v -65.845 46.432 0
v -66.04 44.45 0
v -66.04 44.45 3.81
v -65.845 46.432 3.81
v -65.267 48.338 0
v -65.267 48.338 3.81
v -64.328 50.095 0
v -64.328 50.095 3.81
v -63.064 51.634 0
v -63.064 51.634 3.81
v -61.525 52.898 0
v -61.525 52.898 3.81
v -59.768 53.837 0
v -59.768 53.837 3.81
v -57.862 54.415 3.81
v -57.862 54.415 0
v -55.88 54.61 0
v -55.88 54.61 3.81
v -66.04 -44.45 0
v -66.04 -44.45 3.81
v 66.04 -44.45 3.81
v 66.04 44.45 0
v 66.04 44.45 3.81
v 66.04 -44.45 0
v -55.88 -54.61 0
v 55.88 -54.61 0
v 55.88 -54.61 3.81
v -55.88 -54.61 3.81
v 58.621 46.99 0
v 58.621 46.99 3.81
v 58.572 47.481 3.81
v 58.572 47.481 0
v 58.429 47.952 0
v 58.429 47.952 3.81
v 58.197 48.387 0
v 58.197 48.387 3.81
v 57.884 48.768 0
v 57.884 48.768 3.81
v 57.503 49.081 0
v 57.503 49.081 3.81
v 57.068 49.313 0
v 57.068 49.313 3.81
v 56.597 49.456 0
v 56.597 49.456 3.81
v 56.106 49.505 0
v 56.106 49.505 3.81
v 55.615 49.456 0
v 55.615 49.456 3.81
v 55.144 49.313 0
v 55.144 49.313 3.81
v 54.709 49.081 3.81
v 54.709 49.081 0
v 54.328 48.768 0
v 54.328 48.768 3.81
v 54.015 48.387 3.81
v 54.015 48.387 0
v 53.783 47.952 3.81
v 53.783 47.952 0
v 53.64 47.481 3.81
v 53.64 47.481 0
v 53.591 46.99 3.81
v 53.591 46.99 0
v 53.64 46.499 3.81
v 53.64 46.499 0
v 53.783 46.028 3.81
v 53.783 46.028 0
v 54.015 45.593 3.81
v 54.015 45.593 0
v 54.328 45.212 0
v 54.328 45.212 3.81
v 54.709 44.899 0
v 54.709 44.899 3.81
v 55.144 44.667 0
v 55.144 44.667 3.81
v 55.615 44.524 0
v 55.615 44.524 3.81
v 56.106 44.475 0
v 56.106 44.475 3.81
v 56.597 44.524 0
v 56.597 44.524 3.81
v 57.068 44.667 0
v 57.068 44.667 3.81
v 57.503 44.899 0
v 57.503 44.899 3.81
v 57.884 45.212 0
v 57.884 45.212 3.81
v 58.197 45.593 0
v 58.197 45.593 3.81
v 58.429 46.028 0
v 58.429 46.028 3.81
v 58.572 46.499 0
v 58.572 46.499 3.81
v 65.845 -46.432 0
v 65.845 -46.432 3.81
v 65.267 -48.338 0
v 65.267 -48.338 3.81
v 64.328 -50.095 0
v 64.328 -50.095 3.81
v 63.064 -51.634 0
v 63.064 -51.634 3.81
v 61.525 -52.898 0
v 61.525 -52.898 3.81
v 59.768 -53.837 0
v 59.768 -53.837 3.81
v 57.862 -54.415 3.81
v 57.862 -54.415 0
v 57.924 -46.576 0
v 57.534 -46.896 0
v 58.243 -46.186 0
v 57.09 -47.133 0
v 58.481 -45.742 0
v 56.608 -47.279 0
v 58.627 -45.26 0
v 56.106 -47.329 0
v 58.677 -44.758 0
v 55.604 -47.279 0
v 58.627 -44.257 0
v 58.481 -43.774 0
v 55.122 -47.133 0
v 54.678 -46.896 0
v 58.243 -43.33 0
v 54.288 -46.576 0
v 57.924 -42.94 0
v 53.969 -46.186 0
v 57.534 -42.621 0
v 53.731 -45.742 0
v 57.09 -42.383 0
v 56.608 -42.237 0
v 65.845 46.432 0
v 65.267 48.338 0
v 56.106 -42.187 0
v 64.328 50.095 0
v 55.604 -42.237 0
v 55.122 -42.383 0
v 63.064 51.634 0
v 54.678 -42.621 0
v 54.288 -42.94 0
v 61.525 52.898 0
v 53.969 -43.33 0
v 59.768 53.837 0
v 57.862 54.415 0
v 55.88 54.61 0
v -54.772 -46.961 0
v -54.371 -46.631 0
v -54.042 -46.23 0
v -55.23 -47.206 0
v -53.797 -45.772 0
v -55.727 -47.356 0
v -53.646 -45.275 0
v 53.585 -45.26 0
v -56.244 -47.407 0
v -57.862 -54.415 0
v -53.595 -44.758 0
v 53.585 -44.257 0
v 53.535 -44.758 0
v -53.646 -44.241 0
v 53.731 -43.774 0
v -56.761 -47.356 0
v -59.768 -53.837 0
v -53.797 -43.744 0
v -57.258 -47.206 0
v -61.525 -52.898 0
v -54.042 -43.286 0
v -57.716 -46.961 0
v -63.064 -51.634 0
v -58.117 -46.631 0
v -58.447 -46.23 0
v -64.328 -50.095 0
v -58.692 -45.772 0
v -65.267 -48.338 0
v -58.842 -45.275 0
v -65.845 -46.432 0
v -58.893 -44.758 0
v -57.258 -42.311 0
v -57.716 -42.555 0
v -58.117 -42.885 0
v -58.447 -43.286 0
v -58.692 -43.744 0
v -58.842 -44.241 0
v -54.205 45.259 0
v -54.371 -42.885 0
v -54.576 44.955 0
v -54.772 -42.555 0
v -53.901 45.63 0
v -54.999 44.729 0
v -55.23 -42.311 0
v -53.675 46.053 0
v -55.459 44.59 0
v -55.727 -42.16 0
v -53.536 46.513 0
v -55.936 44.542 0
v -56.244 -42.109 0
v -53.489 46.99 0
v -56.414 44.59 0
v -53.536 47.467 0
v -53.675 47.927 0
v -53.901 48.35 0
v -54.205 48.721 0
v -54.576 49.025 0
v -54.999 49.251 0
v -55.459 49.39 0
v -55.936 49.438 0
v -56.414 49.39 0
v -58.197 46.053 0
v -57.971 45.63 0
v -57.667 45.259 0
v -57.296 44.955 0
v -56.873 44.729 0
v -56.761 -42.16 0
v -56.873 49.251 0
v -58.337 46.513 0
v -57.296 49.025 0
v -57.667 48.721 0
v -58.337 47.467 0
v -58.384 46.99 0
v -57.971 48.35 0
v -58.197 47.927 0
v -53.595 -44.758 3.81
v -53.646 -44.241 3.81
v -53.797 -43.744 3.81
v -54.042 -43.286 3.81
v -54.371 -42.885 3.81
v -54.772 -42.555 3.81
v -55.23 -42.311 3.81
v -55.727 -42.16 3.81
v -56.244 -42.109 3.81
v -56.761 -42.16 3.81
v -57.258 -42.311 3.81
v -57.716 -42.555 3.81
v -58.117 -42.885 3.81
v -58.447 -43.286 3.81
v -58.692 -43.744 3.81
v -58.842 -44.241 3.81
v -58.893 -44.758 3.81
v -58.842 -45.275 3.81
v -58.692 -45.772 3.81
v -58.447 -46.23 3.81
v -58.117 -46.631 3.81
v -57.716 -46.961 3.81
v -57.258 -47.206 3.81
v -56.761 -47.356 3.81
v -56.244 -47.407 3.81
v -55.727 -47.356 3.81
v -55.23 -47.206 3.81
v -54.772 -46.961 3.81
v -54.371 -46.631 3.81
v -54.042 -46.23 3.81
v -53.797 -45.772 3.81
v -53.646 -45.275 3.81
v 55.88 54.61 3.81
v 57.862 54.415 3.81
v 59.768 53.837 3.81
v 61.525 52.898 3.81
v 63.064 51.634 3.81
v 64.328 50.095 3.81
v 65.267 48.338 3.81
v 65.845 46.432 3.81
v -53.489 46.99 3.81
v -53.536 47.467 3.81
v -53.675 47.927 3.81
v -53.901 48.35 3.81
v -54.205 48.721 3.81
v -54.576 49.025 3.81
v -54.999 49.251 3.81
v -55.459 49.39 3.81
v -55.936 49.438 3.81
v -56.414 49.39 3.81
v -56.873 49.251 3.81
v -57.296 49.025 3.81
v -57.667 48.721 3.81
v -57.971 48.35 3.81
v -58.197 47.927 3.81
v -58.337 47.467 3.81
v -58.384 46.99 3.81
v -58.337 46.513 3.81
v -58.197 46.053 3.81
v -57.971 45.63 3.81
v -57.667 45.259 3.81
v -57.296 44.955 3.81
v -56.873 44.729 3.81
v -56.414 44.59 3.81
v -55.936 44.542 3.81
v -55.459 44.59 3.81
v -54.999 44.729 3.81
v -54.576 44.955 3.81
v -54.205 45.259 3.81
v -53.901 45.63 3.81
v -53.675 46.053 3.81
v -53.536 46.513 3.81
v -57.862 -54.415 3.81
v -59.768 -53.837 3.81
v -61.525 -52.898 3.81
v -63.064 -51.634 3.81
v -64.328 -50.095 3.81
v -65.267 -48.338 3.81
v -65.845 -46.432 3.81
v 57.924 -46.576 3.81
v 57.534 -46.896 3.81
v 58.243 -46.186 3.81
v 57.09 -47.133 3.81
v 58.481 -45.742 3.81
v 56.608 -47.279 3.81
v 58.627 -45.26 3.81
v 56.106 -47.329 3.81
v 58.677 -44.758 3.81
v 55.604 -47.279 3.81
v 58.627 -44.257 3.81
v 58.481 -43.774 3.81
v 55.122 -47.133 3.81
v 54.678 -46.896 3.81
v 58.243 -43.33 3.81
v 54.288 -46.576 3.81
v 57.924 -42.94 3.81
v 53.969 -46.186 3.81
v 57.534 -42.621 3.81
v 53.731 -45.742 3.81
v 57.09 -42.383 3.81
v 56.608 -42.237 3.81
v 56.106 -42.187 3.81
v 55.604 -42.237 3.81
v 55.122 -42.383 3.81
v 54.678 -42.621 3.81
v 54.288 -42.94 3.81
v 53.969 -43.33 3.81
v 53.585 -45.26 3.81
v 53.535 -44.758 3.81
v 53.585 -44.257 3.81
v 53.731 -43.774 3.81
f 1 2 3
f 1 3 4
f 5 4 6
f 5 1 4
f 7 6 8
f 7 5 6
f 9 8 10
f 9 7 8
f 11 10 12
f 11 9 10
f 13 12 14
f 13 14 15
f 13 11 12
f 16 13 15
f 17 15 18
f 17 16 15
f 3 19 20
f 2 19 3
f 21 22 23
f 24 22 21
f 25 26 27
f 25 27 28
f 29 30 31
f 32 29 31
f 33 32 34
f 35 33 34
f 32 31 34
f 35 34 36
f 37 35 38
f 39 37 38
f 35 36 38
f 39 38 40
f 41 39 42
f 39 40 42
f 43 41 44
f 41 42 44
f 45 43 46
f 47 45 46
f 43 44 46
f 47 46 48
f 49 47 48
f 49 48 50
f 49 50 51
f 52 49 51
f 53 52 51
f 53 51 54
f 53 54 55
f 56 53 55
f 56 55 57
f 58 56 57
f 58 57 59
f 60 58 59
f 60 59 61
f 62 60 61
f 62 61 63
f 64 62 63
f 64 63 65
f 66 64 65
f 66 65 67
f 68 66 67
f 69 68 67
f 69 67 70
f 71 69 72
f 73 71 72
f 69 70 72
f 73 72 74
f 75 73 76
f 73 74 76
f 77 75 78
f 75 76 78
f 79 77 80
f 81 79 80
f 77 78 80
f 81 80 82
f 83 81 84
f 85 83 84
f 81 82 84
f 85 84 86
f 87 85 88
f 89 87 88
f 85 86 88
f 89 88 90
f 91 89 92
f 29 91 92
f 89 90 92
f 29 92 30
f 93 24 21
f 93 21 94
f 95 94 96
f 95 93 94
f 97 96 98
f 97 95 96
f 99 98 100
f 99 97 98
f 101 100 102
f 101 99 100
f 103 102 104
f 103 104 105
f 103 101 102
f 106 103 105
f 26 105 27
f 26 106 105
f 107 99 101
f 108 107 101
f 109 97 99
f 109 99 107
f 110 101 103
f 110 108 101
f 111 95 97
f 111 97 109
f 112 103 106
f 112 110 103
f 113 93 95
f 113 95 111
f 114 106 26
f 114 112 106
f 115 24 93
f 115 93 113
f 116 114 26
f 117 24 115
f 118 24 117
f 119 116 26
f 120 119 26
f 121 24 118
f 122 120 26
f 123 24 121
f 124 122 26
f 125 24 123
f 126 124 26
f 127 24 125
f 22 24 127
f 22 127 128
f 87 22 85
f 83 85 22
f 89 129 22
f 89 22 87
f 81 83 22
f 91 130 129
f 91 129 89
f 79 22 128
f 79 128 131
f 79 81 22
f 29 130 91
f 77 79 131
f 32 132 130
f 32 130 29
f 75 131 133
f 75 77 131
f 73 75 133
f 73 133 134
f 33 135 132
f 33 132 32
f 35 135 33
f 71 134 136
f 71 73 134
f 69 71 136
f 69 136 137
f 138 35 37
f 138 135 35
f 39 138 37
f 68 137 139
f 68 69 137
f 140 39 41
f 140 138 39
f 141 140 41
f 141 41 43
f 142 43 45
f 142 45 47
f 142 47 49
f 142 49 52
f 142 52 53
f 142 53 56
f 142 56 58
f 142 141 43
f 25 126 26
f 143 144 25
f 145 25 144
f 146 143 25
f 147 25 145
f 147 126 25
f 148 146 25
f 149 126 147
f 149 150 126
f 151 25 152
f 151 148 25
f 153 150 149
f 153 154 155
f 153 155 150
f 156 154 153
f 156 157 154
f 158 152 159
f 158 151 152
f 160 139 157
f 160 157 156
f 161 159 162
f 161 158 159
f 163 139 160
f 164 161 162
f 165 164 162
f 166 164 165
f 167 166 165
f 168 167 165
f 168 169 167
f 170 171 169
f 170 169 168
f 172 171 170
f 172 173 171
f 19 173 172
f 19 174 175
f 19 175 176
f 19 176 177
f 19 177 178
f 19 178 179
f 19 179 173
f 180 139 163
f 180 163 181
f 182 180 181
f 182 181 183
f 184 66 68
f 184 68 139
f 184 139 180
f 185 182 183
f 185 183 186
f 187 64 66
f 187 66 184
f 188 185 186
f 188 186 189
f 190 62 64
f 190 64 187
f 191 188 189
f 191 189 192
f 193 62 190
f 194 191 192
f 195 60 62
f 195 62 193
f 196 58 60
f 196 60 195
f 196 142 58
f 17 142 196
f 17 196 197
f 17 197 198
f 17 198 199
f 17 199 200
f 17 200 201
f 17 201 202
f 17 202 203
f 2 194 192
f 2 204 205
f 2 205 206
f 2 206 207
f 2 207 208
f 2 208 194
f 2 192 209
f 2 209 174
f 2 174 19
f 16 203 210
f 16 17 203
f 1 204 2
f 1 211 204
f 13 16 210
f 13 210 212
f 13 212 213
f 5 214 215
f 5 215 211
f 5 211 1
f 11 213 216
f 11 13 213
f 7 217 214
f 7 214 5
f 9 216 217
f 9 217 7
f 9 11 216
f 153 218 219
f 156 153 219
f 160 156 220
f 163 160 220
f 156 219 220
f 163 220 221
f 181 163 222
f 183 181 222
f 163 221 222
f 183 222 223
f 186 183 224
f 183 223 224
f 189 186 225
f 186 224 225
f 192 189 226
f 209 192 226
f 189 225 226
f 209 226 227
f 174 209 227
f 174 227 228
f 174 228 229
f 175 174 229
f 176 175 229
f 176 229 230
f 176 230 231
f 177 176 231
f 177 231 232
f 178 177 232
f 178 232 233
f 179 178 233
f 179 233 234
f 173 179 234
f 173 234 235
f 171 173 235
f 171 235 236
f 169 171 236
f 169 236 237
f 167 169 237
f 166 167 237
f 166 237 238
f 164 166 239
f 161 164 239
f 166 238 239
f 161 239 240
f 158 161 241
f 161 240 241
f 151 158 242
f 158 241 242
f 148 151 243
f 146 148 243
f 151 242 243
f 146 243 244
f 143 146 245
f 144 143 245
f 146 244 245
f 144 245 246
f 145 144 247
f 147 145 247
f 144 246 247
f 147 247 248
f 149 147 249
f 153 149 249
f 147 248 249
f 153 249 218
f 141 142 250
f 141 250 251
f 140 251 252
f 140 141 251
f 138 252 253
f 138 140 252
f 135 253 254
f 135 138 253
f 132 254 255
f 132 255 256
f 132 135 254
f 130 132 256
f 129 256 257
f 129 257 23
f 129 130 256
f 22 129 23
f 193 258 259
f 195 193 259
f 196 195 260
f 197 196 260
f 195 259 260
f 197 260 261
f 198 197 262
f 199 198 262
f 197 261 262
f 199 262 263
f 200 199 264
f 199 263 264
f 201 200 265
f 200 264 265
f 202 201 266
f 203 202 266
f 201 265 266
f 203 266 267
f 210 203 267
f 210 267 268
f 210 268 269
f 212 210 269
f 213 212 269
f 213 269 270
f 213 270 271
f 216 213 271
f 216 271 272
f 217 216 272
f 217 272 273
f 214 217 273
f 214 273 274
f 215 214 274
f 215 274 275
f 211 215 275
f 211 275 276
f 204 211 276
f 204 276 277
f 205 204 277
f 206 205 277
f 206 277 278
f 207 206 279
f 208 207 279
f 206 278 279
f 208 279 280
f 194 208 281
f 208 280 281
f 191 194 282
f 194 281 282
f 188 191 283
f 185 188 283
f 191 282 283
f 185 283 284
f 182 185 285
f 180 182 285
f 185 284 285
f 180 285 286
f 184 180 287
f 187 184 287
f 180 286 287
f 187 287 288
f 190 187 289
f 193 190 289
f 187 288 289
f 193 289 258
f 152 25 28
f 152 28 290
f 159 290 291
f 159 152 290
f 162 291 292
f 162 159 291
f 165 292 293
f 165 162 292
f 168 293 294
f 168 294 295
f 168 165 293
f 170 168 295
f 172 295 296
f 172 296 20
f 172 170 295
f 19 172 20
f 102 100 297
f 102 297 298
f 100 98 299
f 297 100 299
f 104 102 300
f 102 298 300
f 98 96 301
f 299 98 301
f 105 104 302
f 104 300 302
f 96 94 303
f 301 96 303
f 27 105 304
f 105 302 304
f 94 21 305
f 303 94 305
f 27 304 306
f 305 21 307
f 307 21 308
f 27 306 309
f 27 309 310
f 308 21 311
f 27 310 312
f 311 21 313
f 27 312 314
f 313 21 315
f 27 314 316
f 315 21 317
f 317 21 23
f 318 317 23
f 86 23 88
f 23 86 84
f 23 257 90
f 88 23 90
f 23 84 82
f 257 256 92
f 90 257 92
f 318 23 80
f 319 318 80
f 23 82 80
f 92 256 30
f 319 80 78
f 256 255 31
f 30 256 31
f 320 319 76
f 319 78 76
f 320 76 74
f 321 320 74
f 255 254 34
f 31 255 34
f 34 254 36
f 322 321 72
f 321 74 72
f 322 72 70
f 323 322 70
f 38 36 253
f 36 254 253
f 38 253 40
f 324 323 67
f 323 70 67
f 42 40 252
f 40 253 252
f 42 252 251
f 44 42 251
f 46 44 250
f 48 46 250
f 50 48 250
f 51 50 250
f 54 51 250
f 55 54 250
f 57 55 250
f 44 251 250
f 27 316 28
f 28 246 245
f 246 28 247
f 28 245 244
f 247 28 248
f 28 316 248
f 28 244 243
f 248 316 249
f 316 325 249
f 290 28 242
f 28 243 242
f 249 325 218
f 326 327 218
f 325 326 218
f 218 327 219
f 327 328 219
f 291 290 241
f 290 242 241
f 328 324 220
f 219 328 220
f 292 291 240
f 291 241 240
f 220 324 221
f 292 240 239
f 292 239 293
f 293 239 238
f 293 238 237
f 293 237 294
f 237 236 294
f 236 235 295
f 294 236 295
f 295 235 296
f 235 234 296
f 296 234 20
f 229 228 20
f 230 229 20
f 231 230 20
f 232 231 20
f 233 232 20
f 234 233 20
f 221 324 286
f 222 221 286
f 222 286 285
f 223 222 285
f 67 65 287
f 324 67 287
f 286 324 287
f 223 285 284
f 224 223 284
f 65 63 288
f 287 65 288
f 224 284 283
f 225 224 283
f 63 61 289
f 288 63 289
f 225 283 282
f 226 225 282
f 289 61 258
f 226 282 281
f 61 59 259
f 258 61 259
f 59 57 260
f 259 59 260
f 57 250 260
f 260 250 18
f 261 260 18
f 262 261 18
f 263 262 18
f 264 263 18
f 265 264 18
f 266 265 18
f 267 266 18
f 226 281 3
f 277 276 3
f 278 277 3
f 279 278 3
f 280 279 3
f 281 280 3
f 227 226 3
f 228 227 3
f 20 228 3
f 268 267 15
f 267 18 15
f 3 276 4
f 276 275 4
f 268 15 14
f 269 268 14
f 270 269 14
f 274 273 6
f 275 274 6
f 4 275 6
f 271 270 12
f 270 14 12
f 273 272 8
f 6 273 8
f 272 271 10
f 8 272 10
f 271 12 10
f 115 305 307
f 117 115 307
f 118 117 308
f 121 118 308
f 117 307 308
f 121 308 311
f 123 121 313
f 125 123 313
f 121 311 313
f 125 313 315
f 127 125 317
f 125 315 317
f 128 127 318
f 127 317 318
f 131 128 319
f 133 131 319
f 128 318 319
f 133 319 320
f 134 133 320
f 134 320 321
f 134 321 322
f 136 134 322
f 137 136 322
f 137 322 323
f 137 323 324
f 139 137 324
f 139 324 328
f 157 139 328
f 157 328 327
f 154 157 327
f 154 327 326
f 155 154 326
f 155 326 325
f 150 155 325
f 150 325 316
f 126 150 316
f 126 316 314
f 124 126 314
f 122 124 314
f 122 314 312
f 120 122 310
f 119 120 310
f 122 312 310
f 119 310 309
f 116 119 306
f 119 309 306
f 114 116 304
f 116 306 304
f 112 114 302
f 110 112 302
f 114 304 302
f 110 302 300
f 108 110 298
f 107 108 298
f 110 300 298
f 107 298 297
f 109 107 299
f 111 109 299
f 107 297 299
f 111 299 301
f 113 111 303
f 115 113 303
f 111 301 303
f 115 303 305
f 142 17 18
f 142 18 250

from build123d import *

# Parameters (mm, degrees)
BOSS_EXTRUDE1_DEPTH = 3.81
CUT_EXTRUDE1_REACH  = 87.779
SKETCH2_R           = 2.447521694
SKETCH2_R_2         = 2.514751493
SKETCH2_R_3         = 2.570723965
SKETCH2_R_4         = 2.649131916


with BuildPart() as part:
    # Sketch1 → Boss-Extrude1 (new body)
    with BuildSketch(Plane.XY):
        with BuildLine():
            Line((55.88, -54.61), (-55.88, -54.61))
            ThreePointArc((-55.88, -54.61), (-63.064204897, -51.634204897), (-66.04, -44.45))
            Line((-66.04, -44.45), (-66.04, 44.45))
            ThreePointArc((-66.04, 44.45), (-63.064204897, 51.634204897), (-55.88, 54.61))
            Line((-55.88, 54.61), (55.88, 54.61))
            ThreePointArc((55.88, 54.61), (63.064204897, 51.634204897), (66.04, 44.45))
            Line((66.04, 44.45), (66.04, -44.45))
            ThreePointArc((66.04, -44.45), (63.064204897, -51.634204897), (55.88, -54.61))
        make_face()
    extrude(amount=BOSS_EXTRUDE1_DEPTH)

    # Sketch2 → Cut-Extrude1 (cut, up to next)
    with BuildSketch(Plane.XY.offset(3.81), mode=Mode.PRIVATE) as cut_extrude1_sk1:
        with Locations((-55.936087501, 46.99)):
            Circle(SKETCH2_R)
    cut_extrude1_tool1 = extrude(cut_extrude1_sk1.sketch, amount=-CUT_EXTRUDE1_REACH, mode=Mode.PRIVATE) & part.part
    # Sketch2 → Cut-Extrude1 (cut, up to next)
    with BuildSketch(Plane.XY.offset(3.81), mode=Mode.PRIVATE) as cut_extrude1_sk2:
        with Locations((56.105983157, 46.99)):
            Circle(SKETCH2_R_2)
    cut_extrude1_tool2 = extrude(cut_extrude1_sk2.sketch, amount=-CUT_EXTRUDE1_REACH, mode=Mode.PRIVATE) & part.part
    # Sketch2 → Cut-Extrude1 (cut, up to next)
    with BuildSketch(Plane.XY.offset(3.81), mode=Mode.PRIVATE) as cut_extrude1_sk3:
        with Locations((56.105983157, -44.758153673)):
            Circle(SKETCH2_R_3)
    cut_extrude1_tool3 = extrude(cut_extrude1_sk3.sketch, amount=-CUT_EXTRUDE1_REACH, mode=Mode.PRIVATE) & part.part
    # Sketch2 → Cut-Extrude1 (cut, up to next)
    with BuildSketch(Plane.XY.offset(3.81), mode=Mode.PRIVATE) as cut_extrude1_sk4:
        with Locations((-56.244241173, -44.758153673)):
            Circle(SKETCH2_R_4)
    cut_extrude1_tool4 = extrude(cut_extrude1_sk4.sketch, amount=-CUT_EXTRUDE1_REACH, mode=Mode.PRIVATE) & part.part
    add(cut_extrude1_tool1.solids().sort_by_distance((-55.936088, 46.99, 3.81))[0], mode=Mode.SUBTRACT)
    add(cut_extrude1_tool2.solids().sort_by_distance((56.105983, 46.99, 3.81))[0], mode=Mode.SUBTRACT)
    add(cut_extrude1_tool3.solids().sort_by_distance((56.105983, -44.758154, 3.81))[0], mode=Mode.SUBTRACT)
    add(cut_extrude1_tool4.solids().sort_by_distance((-56.244241, -44.758154, 3.81))[0], mode=Mode.SUBTRACT)


solid = part.part
